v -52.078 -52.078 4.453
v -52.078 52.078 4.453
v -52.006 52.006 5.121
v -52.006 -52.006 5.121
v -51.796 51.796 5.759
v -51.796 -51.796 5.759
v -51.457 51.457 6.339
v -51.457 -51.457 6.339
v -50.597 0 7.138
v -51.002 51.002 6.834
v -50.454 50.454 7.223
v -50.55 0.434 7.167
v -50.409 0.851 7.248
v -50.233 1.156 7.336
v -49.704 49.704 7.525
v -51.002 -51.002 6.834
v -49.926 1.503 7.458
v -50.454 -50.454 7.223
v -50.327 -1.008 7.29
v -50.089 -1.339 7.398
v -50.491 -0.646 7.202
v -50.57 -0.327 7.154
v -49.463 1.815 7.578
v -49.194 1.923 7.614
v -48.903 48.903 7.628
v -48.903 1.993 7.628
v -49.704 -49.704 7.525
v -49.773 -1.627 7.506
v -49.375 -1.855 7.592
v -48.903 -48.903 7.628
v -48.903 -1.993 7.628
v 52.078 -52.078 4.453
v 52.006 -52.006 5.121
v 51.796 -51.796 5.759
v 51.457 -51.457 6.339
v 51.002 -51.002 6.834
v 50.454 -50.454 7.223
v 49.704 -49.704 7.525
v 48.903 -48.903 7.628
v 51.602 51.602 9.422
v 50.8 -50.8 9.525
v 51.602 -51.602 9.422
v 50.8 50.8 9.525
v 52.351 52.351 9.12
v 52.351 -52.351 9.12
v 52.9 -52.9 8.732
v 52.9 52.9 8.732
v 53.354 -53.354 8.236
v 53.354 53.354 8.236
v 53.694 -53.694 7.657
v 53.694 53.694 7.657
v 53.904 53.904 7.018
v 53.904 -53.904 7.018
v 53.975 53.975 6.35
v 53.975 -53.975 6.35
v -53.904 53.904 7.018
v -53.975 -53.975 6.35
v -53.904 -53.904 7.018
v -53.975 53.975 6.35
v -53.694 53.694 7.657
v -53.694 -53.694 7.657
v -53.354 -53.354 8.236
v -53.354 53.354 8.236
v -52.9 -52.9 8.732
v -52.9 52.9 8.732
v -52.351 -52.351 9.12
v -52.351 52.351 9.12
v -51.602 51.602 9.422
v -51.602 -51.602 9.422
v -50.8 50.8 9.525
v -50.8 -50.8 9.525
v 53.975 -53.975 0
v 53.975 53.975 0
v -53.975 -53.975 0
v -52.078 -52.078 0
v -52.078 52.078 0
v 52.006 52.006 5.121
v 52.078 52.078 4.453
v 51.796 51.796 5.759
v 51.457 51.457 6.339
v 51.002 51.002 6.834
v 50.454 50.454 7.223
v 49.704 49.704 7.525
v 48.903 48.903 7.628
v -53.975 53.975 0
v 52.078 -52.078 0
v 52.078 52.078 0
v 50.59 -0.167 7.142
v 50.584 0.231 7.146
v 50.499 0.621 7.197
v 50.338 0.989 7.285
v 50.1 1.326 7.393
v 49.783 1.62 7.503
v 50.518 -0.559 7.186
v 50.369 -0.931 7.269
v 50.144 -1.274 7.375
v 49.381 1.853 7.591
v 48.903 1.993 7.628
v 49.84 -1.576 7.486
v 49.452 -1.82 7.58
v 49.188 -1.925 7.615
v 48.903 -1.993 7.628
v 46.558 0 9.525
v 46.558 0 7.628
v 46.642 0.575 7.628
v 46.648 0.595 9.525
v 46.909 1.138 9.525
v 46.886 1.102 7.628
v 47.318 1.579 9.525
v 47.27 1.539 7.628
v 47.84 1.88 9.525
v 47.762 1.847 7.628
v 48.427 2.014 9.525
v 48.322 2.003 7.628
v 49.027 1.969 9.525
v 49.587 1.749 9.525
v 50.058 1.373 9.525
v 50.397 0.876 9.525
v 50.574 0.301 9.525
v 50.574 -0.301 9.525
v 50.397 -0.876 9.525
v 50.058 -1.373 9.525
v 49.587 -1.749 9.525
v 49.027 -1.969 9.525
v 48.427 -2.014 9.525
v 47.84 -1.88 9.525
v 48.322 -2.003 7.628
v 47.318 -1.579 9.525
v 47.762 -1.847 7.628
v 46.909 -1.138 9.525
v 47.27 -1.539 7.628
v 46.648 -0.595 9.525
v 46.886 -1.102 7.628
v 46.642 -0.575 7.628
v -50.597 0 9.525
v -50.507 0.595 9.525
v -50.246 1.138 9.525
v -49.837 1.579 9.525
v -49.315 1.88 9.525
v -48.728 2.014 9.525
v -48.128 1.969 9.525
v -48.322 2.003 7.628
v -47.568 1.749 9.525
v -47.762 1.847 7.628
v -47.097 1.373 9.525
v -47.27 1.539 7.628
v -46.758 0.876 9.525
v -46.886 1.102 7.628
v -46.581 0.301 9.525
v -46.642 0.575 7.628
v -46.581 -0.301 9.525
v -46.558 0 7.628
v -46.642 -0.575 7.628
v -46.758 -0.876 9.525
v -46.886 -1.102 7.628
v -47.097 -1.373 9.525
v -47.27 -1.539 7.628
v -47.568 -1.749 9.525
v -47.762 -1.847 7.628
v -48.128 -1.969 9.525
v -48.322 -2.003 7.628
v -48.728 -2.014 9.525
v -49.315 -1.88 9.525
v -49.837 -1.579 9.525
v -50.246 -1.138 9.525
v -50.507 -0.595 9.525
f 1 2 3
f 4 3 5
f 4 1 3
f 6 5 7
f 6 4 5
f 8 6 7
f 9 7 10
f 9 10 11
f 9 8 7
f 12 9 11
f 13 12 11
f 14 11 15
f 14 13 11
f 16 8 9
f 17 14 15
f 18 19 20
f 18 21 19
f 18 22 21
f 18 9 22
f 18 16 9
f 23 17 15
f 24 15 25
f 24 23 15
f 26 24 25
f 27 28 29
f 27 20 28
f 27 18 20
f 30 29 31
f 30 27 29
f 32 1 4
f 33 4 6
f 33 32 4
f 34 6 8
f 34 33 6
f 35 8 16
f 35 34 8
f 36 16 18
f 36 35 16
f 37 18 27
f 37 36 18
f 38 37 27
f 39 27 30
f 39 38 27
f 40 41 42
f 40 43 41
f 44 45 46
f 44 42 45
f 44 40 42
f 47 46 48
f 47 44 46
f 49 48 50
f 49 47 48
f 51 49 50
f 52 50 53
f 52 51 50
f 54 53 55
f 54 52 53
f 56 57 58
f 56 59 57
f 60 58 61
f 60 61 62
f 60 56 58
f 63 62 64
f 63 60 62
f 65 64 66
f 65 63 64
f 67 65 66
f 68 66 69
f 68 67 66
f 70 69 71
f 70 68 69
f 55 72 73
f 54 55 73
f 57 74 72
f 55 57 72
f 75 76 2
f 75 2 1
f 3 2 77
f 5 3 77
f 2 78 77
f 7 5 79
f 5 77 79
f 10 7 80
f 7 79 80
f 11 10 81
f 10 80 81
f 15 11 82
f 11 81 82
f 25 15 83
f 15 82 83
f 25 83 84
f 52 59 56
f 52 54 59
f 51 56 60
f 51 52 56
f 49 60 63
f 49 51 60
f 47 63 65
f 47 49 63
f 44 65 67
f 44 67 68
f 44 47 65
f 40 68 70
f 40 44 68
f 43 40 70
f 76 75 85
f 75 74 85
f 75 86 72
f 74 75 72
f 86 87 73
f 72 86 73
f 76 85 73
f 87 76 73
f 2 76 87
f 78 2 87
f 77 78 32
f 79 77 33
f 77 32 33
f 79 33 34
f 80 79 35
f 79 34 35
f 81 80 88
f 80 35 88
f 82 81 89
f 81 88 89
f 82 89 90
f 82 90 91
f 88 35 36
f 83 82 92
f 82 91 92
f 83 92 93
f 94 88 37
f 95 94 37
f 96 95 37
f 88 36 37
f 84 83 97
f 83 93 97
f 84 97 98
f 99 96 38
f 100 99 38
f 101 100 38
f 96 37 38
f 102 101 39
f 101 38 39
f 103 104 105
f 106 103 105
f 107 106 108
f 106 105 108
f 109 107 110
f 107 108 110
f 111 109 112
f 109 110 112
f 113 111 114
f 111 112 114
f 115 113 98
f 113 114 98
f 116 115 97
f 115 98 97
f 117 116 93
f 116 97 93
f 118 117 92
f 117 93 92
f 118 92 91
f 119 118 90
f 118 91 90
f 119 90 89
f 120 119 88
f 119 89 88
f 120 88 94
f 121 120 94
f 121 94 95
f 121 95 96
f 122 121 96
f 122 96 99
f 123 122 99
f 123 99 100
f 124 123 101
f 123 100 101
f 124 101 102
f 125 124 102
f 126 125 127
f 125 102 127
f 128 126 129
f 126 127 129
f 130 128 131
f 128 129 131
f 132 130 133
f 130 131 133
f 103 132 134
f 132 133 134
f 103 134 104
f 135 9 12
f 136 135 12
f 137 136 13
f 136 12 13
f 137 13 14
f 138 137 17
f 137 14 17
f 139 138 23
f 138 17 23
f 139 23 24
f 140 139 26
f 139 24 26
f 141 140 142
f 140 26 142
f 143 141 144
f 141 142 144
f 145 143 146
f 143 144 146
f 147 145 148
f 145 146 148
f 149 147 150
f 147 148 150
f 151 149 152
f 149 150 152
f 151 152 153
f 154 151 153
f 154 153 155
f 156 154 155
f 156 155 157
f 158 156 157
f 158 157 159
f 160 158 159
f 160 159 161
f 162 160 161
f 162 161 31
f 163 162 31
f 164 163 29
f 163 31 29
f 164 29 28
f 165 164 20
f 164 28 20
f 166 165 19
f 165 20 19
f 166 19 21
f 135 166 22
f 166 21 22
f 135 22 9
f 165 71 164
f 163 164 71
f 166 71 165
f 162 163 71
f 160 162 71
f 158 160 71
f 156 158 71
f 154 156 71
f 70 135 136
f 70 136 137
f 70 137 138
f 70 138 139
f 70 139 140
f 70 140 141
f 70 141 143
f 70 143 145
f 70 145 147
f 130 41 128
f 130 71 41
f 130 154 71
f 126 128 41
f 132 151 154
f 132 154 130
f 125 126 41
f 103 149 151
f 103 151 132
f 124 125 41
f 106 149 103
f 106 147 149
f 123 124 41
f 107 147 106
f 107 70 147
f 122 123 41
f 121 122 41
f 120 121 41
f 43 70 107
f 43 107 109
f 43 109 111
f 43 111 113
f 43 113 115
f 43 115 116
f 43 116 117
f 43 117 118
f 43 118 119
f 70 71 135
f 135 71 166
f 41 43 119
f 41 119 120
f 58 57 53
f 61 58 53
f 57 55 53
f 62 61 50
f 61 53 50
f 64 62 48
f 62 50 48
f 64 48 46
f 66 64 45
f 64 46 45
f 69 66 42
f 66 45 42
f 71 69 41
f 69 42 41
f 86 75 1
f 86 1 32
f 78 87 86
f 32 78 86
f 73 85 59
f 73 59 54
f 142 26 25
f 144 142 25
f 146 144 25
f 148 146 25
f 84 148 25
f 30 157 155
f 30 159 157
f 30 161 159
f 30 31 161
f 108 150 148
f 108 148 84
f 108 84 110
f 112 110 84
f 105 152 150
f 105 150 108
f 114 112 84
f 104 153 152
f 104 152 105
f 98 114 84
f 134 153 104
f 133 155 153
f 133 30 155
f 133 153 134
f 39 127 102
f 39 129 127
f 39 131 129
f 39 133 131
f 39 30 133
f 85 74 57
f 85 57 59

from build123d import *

# Parameters (mm, degrees)
F0_W     = 107.95
F0_H     = 107.95
F1_DEPTH = 9.525
F2_W     = 104.15524
F2_H     = 104.15524
F3_DEPTH = 7.62762
F4_R     = 3.175
F6_D     = 4.0386
F6_DEPTH = 8.89
F6_TIP   = 1.213317848


with BuildPart() as f1:
    # F0 (on Top) → F1 (new body)
    with BuildSketch(Plane.XY):
        Rectangle(F0_W, F0_H)
    extrude(amount=F1_DEPTH)

    # F2 (on face) → F3 (cut)
    with BuildSketch(Plane(origin=(0, 0, 0), x_dir=(1, 0, 0), z_dir=(0, 0, -1))):
        Rectangle(F2_W, F2_H)
    extrude(amount=-F3_DEPTH, mode=Mode.SUBTRACT)

    # F4
    f4_edges = [f1.edges().sort_by_distance(p)[0] for p in [
        (0, -52.07762, 7.62762),
        (-52.07762, 0, 7.62762),
        (0, 52.07762, 7.62762),
        (52.07762, 0, 7.62762),
        (0, 53.975, 9.525),
        (-53.975, 0, 9.525),
        (0, -53.975, 9.525),
        (53.975, 0, 9.525),
    ]]
    fillet(f4_edges, radius=F4_R)

    # F6
    with Locations(Plane.XY.offset(9.525)):
        with Locations((-48.5775, 0), (48.5775, 0)):
            Hole(F6_D / 2, depth=F6_DEPTH)
            with Locations((0, 0, -(F6_DEPTH + F6_TIP / 2))):  # 118° drill point
                Cone(0, F6_D / 2, F6_TIP, mode=Mode.SUBTRACT)


solid = f1.part
